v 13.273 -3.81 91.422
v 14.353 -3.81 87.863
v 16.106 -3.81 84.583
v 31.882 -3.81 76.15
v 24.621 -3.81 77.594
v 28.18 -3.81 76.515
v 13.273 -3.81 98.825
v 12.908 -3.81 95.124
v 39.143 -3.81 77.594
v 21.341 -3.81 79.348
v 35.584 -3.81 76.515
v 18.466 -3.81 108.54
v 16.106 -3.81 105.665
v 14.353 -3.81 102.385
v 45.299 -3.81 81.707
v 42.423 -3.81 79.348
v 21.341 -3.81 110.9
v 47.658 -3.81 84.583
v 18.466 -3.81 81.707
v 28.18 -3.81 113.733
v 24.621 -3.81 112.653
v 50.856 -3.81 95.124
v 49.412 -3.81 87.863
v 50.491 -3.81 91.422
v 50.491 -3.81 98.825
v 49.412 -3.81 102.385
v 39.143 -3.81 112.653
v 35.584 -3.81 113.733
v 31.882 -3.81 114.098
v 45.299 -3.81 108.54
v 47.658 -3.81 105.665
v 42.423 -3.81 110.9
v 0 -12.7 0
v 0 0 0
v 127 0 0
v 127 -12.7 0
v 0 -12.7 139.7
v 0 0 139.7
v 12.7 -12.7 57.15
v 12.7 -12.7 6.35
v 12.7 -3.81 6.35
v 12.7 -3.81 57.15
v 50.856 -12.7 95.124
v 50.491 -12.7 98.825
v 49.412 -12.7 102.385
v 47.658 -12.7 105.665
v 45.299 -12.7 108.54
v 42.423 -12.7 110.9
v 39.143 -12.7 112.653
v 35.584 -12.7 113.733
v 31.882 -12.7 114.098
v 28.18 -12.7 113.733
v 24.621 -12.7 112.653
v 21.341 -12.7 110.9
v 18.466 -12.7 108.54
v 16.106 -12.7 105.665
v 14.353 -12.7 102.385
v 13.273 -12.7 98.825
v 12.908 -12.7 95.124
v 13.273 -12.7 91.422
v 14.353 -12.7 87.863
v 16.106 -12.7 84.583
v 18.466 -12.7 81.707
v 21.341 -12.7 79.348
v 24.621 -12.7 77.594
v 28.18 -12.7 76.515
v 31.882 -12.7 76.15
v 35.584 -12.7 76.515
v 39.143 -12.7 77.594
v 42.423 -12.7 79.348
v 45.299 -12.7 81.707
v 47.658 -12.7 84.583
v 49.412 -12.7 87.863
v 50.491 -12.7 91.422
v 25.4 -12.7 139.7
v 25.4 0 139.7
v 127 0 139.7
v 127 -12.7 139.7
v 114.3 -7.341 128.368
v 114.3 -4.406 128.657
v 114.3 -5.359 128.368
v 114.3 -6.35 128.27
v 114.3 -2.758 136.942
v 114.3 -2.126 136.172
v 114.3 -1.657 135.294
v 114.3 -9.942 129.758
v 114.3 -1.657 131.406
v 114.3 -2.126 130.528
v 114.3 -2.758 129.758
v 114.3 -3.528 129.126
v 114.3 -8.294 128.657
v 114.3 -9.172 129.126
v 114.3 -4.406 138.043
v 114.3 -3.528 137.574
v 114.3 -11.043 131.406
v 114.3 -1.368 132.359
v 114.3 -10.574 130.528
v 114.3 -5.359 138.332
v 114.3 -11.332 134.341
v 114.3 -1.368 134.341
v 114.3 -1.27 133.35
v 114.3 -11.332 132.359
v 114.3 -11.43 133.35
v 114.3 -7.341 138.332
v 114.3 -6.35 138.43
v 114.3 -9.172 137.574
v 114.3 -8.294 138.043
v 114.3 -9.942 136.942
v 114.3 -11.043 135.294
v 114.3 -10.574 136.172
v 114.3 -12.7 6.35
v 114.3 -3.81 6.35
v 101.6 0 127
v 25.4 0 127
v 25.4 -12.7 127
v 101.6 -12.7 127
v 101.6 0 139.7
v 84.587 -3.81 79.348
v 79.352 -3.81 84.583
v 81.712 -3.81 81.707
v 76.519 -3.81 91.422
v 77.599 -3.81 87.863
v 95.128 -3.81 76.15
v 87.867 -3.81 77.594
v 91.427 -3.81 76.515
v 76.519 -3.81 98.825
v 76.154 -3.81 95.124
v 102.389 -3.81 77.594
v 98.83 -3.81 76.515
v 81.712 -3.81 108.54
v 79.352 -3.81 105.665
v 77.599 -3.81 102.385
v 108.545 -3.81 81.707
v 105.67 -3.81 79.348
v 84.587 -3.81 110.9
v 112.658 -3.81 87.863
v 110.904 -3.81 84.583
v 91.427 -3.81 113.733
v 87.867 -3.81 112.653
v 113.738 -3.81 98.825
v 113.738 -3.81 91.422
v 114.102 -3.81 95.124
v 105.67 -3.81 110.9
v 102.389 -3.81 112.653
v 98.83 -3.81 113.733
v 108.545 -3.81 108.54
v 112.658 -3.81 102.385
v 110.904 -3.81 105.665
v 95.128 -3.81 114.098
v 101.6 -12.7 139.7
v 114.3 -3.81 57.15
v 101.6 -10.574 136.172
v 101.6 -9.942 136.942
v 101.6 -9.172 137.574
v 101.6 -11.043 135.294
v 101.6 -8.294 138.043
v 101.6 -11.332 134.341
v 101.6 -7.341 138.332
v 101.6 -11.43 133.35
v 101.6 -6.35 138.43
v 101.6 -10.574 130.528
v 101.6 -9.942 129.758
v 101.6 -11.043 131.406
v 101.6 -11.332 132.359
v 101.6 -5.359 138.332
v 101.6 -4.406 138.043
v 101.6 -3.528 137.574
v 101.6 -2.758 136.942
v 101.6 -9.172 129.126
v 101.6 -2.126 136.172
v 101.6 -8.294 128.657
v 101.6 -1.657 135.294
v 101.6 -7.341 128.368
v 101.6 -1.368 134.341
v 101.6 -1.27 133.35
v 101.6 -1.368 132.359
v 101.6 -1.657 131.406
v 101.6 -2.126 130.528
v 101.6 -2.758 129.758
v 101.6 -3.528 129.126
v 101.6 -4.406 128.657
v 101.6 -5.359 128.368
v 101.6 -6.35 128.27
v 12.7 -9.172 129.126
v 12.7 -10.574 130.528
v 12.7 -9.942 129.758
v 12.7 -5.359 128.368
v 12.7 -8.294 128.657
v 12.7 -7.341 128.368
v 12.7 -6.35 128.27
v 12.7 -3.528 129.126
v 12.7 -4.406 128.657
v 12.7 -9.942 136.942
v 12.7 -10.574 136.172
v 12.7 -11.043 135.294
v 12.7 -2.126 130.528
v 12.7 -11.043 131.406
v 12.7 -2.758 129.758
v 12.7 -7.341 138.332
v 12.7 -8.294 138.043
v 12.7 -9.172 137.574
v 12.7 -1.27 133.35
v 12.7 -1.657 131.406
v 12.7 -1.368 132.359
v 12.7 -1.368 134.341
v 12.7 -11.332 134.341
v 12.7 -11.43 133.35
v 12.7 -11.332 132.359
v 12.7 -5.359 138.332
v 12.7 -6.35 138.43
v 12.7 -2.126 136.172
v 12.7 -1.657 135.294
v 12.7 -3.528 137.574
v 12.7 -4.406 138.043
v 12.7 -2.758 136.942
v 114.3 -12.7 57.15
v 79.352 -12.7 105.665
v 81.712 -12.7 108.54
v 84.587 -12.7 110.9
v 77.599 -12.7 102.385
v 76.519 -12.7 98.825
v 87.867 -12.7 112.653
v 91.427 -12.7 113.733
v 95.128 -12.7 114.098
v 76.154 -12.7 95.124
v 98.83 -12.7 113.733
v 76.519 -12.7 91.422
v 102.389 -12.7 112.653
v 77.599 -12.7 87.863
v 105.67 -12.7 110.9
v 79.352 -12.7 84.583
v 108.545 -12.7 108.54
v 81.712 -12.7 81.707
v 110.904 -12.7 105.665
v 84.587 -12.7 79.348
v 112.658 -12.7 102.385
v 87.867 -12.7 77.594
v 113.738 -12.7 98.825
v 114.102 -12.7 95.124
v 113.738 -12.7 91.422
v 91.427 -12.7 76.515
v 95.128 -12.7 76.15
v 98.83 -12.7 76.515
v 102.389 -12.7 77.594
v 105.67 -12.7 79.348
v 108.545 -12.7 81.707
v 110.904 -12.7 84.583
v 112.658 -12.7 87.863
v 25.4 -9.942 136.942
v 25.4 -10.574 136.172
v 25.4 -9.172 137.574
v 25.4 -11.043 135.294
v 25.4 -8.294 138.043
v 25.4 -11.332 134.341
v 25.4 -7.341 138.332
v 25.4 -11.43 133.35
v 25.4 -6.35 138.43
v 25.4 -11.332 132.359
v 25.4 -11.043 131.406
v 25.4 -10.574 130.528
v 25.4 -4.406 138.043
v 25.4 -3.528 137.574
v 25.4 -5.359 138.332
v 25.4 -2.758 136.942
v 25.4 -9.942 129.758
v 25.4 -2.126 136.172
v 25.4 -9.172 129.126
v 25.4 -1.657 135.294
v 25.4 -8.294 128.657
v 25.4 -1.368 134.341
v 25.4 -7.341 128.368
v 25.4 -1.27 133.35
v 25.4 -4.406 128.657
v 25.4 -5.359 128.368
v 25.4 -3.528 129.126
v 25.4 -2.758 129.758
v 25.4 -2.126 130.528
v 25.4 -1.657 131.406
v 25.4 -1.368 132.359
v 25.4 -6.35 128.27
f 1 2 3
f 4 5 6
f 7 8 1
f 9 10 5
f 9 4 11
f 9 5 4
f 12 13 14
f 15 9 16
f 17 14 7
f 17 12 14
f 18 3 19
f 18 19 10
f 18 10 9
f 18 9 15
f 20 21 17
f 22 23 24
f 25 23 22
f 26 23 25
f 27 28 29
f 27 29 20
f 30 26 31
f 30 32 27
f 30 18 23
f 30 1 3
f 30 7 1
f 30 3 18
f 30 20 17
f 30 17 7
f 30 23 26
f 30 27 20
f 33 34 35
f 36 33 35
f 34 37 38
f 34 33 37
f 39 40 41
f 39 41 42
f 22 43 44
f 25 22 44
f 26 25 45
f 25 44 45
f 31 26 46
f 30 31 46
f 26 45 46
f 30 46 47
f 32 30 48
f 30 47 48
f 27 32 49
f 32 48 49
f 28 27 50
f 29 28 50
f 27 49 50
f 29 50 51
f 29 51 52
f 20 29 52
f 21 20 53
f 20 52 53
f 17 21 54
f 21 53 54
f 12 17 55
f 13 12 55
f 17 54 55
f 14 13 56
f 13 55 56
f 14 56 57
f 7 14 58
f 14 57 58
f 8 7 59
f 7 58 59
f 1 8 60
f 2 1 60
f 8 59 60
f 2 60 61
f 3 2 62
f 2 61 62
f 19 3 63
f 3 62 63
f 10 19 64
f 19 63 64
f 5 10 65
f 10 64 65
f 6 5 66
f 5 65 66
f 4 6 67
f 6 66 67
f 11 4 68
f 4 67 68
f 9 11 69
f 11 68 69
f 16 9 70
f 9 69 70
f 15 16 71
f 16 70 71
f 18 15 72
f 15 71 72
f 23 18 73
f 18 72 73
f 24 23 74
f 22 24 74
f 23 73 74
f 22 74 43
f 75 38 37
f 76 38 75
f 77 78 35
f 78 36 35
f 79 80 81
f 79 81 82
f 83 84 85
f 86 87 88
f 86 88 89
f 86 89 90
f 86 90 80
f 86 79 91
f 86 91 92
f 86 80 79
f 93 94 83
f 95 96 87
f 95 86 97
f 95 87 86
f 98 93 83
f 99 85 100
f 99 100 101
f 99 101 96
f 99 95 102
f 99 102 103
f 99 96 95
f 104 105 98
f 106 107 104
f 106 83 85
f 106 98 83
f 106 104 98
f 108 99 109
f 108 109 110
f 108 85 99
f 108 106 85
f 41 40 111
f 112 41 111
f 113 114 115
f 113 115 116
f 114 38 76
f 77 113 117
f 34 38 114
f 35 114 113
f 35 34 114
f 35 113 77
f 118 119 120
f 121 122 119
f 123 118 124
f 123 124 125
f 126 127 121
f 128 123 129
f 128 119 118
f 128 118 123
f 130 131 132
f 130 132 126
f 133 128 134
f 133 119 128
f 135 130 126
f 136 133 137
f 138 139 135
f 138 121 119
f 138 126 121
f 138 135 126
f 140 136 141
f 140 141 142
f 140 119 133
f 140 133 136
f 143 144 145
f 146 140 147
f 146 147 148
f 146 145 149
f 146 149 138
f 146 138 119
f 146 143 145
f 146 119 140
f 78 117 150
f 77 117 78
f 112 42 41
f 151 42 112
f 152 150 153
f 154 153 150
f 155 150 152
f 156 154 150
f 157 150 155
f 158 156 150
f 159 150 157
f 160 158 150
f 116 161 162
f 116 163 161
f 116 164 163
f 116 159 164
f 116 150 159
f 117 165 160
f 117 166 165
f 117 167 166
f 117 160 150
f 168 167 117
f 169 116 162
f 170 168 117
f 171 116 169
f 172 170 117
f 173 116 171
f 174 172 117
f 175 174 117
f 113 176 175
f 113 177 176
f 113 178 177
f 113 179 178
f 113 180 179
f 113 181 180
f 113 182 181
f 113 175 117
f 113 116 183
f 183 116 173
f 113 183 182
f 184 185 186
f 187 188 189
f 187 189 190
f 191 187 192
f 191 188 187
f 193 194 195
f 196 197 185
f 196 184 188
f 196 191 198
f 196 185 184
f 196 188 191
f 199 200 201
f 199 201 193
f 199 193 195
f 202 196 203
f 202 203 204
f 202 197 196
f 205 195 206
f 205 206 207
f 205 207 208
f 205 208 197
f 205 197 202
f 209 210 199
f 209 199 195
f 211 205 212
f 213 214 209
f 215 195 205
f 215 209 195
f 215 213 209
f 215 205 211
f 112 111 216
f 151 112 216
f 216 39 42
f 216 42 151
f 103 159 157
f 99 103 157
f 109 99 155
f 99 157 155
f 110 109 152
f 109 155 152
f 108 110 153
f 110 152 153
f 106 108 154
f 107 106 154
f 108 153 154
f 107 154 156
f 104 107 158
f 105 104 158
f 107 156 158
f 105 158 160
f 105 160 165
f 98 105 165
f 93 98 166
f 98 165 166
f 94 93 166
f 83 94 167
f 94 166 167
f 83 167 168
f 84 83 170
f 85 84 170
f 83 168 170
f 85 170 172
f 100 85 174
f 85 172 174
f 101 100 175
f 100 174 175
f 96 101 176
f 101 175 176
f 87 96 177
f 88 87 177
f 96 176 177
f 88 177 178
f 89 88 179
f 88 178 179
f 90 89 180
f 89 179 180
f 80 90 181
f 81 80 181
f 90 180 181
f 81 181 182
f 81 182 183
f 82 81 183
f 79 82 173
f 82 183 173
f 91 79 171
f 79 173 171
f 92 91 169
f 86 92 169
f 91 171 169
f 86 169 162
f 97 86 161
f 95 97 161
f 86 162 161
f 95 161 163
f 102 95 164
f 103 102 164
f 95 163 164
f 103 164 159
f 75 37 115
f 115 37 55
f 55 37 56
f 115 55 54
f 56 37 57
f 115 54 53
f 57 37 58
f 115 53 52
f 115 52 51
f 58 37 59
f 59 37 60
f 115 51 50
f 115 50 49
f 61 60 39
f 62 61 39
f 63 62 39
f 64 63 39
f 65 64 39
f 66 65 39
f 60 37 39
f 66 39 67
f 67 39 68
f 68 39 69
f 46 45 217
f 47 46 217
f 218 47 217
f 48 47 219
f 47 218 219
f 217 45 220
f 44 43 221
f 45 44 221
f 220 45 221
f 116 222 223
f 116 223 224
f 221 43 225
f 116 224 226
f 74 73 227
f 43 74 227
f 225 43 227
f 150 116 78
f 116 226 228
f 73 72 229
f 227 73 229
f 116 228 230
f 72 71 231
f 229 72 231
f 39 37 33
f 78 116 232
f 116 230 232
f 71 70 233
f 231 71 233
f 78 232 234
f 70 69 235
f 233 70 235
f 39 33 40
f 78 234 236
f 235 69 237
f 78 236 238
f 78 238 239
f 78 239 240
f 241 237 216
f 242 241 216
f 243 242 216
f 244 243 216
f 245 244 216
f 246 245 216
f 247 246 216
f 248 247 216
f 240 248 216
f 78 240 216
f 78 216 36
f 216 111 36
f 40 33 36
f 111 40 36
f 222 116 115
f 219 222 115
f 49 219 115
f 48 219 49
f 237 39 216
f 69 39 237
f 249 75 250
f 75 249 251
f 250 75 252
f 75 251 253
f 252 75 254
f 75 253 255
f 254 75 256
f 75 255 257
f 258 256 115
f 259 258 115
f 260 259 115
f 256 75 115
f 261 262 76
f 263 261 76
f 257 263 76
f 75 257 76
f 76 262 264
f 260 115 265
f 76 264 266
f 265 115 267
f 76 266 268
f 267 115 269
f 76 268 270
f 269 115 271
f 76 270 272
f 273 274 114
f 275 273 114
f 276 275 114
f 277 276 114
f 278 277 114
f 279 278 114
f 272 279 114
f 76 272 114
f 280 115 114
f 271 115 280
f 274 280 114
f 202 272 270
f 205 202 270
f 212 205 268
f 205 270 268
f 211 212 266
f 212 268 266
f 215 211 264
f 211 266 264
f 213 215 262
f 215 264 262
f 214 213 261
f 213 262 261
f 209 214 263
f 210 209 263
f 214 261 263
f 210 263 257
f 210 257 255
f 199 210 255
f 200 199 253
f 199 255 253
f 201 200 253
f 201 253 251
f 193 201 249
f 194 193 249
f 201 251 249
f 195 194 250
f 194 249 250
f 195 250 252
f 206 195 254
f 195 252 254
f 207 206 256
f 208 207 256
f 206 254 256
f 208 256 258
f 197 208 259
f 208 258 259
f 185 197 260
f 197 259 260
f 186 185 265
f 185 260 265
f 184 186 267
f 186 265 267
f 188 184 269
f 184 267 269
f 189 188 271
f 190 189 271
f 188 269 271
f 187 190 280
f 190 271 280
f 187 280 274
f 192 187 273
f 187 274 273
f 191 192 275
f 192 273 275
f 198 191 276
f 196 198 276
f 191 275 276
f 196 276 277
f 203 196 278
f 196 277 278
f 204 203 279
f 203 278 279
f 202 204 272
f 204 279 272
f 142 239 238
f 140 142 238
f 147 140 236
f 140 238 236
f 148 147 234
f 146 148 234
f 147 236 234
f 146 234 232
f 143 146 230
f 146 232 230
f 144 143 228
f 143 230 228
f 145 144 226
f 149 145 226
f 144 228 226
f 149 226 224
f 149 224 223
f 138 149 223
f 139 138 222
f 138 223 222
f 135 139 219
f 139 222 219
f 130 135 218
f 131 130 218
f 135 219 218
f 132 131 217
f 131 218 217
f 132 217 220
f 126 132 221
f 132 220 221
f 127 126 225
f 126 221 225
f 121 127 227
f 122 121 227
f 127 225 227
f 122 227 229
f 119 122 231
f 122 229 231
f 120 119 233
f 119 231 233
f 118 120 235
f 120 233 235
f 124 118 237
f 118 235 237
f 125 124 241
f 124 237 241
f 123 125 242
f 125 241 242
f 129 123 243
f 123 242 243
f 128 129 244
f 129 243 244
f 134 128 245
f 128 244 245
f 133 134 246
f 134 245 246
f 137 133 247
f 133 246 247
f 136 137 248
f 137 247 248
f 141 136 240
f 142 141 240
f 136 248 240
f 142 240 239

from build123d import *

# Parameters (mm, degrees)
F0_W      = 127
F0_H      = 127
F1_DEPTH  = 12.7
F2_R      = 18.973851
F2_W      = 101.6
F2_H      = 50.8
F3_DEPTH  = 8.89
F4_W      = 25.4
F4_H      = 12.7
F5_DEPTH  = 12.7
F7_W      = 25.4
F7_H      = 12.7
F8_DEPTH  = 12.7
F9_R      = 5.08
F10_DEPTH = 12.7
F6_R      = 5.08
F11_DEPTH = 12.7


with BuildPart() as f1:
    # F0 (on Front) → F1 (new body)
    with BuildSketch(Plane.XZ):
        with Locations((63.5, 63.5)):
            Rectangle(F0_W, F0_H)
    extrude(amount=F1_DEPTH)

    # F2 (on face) → F3 (cut)
    with BuildSketch(Plane.XZ.offset(12.7)):
        with Locations((95.128258, 95.123877)):
            Circle(F2_R)
        with Locations((31.882087, 95.123877)):
            Circle(F2_R)
        with Locations((63.5, 31.75)):
            Rectangle(F2_W, F2_H)
    extrude(amount=-F3_DEPTH, mode=Mode.SUBTRACT)

    # F4 (on face) → F5 (join)
    with BuildSketch(Plane.XY.offset(127)):
        with Locations((12.7, -6.35)):
            Rectangle(F4_W, F4_H)
    extrude(amount=F5_DEPTH)

    # F7 (on face) → F8 (join)
    with BuildSketch(Plane.XY.offset(127)):
        with Locations((114.3, -6.35)):
            Rectangle(F7_W, F7_H)
    extrude(amount=F8_DEPTH)

    # F9 (on face) → F10 (cut)
    with BuildSketch(Plane(origin=(101.6, 0, 0), x_dir=(0, -1, 0), z_dir=(-1, 0, 0))):
        with Locations((6.35, 133.35)):
            Circle(F9_R)
    extrude(amount=-F10_DEPTH, mode=Mode.SUBTRACT)

    # F6 (on face) → F11 (cut)
    with BuildSketch(Plane.YZ.offset(25.4)):
        with Locations((-6.35, 133.35)):
            Circle(F6_R)
    extrude(amount=-F11_DEPTH, mode=Mode.SUBTRACT)


solid = f1.part
